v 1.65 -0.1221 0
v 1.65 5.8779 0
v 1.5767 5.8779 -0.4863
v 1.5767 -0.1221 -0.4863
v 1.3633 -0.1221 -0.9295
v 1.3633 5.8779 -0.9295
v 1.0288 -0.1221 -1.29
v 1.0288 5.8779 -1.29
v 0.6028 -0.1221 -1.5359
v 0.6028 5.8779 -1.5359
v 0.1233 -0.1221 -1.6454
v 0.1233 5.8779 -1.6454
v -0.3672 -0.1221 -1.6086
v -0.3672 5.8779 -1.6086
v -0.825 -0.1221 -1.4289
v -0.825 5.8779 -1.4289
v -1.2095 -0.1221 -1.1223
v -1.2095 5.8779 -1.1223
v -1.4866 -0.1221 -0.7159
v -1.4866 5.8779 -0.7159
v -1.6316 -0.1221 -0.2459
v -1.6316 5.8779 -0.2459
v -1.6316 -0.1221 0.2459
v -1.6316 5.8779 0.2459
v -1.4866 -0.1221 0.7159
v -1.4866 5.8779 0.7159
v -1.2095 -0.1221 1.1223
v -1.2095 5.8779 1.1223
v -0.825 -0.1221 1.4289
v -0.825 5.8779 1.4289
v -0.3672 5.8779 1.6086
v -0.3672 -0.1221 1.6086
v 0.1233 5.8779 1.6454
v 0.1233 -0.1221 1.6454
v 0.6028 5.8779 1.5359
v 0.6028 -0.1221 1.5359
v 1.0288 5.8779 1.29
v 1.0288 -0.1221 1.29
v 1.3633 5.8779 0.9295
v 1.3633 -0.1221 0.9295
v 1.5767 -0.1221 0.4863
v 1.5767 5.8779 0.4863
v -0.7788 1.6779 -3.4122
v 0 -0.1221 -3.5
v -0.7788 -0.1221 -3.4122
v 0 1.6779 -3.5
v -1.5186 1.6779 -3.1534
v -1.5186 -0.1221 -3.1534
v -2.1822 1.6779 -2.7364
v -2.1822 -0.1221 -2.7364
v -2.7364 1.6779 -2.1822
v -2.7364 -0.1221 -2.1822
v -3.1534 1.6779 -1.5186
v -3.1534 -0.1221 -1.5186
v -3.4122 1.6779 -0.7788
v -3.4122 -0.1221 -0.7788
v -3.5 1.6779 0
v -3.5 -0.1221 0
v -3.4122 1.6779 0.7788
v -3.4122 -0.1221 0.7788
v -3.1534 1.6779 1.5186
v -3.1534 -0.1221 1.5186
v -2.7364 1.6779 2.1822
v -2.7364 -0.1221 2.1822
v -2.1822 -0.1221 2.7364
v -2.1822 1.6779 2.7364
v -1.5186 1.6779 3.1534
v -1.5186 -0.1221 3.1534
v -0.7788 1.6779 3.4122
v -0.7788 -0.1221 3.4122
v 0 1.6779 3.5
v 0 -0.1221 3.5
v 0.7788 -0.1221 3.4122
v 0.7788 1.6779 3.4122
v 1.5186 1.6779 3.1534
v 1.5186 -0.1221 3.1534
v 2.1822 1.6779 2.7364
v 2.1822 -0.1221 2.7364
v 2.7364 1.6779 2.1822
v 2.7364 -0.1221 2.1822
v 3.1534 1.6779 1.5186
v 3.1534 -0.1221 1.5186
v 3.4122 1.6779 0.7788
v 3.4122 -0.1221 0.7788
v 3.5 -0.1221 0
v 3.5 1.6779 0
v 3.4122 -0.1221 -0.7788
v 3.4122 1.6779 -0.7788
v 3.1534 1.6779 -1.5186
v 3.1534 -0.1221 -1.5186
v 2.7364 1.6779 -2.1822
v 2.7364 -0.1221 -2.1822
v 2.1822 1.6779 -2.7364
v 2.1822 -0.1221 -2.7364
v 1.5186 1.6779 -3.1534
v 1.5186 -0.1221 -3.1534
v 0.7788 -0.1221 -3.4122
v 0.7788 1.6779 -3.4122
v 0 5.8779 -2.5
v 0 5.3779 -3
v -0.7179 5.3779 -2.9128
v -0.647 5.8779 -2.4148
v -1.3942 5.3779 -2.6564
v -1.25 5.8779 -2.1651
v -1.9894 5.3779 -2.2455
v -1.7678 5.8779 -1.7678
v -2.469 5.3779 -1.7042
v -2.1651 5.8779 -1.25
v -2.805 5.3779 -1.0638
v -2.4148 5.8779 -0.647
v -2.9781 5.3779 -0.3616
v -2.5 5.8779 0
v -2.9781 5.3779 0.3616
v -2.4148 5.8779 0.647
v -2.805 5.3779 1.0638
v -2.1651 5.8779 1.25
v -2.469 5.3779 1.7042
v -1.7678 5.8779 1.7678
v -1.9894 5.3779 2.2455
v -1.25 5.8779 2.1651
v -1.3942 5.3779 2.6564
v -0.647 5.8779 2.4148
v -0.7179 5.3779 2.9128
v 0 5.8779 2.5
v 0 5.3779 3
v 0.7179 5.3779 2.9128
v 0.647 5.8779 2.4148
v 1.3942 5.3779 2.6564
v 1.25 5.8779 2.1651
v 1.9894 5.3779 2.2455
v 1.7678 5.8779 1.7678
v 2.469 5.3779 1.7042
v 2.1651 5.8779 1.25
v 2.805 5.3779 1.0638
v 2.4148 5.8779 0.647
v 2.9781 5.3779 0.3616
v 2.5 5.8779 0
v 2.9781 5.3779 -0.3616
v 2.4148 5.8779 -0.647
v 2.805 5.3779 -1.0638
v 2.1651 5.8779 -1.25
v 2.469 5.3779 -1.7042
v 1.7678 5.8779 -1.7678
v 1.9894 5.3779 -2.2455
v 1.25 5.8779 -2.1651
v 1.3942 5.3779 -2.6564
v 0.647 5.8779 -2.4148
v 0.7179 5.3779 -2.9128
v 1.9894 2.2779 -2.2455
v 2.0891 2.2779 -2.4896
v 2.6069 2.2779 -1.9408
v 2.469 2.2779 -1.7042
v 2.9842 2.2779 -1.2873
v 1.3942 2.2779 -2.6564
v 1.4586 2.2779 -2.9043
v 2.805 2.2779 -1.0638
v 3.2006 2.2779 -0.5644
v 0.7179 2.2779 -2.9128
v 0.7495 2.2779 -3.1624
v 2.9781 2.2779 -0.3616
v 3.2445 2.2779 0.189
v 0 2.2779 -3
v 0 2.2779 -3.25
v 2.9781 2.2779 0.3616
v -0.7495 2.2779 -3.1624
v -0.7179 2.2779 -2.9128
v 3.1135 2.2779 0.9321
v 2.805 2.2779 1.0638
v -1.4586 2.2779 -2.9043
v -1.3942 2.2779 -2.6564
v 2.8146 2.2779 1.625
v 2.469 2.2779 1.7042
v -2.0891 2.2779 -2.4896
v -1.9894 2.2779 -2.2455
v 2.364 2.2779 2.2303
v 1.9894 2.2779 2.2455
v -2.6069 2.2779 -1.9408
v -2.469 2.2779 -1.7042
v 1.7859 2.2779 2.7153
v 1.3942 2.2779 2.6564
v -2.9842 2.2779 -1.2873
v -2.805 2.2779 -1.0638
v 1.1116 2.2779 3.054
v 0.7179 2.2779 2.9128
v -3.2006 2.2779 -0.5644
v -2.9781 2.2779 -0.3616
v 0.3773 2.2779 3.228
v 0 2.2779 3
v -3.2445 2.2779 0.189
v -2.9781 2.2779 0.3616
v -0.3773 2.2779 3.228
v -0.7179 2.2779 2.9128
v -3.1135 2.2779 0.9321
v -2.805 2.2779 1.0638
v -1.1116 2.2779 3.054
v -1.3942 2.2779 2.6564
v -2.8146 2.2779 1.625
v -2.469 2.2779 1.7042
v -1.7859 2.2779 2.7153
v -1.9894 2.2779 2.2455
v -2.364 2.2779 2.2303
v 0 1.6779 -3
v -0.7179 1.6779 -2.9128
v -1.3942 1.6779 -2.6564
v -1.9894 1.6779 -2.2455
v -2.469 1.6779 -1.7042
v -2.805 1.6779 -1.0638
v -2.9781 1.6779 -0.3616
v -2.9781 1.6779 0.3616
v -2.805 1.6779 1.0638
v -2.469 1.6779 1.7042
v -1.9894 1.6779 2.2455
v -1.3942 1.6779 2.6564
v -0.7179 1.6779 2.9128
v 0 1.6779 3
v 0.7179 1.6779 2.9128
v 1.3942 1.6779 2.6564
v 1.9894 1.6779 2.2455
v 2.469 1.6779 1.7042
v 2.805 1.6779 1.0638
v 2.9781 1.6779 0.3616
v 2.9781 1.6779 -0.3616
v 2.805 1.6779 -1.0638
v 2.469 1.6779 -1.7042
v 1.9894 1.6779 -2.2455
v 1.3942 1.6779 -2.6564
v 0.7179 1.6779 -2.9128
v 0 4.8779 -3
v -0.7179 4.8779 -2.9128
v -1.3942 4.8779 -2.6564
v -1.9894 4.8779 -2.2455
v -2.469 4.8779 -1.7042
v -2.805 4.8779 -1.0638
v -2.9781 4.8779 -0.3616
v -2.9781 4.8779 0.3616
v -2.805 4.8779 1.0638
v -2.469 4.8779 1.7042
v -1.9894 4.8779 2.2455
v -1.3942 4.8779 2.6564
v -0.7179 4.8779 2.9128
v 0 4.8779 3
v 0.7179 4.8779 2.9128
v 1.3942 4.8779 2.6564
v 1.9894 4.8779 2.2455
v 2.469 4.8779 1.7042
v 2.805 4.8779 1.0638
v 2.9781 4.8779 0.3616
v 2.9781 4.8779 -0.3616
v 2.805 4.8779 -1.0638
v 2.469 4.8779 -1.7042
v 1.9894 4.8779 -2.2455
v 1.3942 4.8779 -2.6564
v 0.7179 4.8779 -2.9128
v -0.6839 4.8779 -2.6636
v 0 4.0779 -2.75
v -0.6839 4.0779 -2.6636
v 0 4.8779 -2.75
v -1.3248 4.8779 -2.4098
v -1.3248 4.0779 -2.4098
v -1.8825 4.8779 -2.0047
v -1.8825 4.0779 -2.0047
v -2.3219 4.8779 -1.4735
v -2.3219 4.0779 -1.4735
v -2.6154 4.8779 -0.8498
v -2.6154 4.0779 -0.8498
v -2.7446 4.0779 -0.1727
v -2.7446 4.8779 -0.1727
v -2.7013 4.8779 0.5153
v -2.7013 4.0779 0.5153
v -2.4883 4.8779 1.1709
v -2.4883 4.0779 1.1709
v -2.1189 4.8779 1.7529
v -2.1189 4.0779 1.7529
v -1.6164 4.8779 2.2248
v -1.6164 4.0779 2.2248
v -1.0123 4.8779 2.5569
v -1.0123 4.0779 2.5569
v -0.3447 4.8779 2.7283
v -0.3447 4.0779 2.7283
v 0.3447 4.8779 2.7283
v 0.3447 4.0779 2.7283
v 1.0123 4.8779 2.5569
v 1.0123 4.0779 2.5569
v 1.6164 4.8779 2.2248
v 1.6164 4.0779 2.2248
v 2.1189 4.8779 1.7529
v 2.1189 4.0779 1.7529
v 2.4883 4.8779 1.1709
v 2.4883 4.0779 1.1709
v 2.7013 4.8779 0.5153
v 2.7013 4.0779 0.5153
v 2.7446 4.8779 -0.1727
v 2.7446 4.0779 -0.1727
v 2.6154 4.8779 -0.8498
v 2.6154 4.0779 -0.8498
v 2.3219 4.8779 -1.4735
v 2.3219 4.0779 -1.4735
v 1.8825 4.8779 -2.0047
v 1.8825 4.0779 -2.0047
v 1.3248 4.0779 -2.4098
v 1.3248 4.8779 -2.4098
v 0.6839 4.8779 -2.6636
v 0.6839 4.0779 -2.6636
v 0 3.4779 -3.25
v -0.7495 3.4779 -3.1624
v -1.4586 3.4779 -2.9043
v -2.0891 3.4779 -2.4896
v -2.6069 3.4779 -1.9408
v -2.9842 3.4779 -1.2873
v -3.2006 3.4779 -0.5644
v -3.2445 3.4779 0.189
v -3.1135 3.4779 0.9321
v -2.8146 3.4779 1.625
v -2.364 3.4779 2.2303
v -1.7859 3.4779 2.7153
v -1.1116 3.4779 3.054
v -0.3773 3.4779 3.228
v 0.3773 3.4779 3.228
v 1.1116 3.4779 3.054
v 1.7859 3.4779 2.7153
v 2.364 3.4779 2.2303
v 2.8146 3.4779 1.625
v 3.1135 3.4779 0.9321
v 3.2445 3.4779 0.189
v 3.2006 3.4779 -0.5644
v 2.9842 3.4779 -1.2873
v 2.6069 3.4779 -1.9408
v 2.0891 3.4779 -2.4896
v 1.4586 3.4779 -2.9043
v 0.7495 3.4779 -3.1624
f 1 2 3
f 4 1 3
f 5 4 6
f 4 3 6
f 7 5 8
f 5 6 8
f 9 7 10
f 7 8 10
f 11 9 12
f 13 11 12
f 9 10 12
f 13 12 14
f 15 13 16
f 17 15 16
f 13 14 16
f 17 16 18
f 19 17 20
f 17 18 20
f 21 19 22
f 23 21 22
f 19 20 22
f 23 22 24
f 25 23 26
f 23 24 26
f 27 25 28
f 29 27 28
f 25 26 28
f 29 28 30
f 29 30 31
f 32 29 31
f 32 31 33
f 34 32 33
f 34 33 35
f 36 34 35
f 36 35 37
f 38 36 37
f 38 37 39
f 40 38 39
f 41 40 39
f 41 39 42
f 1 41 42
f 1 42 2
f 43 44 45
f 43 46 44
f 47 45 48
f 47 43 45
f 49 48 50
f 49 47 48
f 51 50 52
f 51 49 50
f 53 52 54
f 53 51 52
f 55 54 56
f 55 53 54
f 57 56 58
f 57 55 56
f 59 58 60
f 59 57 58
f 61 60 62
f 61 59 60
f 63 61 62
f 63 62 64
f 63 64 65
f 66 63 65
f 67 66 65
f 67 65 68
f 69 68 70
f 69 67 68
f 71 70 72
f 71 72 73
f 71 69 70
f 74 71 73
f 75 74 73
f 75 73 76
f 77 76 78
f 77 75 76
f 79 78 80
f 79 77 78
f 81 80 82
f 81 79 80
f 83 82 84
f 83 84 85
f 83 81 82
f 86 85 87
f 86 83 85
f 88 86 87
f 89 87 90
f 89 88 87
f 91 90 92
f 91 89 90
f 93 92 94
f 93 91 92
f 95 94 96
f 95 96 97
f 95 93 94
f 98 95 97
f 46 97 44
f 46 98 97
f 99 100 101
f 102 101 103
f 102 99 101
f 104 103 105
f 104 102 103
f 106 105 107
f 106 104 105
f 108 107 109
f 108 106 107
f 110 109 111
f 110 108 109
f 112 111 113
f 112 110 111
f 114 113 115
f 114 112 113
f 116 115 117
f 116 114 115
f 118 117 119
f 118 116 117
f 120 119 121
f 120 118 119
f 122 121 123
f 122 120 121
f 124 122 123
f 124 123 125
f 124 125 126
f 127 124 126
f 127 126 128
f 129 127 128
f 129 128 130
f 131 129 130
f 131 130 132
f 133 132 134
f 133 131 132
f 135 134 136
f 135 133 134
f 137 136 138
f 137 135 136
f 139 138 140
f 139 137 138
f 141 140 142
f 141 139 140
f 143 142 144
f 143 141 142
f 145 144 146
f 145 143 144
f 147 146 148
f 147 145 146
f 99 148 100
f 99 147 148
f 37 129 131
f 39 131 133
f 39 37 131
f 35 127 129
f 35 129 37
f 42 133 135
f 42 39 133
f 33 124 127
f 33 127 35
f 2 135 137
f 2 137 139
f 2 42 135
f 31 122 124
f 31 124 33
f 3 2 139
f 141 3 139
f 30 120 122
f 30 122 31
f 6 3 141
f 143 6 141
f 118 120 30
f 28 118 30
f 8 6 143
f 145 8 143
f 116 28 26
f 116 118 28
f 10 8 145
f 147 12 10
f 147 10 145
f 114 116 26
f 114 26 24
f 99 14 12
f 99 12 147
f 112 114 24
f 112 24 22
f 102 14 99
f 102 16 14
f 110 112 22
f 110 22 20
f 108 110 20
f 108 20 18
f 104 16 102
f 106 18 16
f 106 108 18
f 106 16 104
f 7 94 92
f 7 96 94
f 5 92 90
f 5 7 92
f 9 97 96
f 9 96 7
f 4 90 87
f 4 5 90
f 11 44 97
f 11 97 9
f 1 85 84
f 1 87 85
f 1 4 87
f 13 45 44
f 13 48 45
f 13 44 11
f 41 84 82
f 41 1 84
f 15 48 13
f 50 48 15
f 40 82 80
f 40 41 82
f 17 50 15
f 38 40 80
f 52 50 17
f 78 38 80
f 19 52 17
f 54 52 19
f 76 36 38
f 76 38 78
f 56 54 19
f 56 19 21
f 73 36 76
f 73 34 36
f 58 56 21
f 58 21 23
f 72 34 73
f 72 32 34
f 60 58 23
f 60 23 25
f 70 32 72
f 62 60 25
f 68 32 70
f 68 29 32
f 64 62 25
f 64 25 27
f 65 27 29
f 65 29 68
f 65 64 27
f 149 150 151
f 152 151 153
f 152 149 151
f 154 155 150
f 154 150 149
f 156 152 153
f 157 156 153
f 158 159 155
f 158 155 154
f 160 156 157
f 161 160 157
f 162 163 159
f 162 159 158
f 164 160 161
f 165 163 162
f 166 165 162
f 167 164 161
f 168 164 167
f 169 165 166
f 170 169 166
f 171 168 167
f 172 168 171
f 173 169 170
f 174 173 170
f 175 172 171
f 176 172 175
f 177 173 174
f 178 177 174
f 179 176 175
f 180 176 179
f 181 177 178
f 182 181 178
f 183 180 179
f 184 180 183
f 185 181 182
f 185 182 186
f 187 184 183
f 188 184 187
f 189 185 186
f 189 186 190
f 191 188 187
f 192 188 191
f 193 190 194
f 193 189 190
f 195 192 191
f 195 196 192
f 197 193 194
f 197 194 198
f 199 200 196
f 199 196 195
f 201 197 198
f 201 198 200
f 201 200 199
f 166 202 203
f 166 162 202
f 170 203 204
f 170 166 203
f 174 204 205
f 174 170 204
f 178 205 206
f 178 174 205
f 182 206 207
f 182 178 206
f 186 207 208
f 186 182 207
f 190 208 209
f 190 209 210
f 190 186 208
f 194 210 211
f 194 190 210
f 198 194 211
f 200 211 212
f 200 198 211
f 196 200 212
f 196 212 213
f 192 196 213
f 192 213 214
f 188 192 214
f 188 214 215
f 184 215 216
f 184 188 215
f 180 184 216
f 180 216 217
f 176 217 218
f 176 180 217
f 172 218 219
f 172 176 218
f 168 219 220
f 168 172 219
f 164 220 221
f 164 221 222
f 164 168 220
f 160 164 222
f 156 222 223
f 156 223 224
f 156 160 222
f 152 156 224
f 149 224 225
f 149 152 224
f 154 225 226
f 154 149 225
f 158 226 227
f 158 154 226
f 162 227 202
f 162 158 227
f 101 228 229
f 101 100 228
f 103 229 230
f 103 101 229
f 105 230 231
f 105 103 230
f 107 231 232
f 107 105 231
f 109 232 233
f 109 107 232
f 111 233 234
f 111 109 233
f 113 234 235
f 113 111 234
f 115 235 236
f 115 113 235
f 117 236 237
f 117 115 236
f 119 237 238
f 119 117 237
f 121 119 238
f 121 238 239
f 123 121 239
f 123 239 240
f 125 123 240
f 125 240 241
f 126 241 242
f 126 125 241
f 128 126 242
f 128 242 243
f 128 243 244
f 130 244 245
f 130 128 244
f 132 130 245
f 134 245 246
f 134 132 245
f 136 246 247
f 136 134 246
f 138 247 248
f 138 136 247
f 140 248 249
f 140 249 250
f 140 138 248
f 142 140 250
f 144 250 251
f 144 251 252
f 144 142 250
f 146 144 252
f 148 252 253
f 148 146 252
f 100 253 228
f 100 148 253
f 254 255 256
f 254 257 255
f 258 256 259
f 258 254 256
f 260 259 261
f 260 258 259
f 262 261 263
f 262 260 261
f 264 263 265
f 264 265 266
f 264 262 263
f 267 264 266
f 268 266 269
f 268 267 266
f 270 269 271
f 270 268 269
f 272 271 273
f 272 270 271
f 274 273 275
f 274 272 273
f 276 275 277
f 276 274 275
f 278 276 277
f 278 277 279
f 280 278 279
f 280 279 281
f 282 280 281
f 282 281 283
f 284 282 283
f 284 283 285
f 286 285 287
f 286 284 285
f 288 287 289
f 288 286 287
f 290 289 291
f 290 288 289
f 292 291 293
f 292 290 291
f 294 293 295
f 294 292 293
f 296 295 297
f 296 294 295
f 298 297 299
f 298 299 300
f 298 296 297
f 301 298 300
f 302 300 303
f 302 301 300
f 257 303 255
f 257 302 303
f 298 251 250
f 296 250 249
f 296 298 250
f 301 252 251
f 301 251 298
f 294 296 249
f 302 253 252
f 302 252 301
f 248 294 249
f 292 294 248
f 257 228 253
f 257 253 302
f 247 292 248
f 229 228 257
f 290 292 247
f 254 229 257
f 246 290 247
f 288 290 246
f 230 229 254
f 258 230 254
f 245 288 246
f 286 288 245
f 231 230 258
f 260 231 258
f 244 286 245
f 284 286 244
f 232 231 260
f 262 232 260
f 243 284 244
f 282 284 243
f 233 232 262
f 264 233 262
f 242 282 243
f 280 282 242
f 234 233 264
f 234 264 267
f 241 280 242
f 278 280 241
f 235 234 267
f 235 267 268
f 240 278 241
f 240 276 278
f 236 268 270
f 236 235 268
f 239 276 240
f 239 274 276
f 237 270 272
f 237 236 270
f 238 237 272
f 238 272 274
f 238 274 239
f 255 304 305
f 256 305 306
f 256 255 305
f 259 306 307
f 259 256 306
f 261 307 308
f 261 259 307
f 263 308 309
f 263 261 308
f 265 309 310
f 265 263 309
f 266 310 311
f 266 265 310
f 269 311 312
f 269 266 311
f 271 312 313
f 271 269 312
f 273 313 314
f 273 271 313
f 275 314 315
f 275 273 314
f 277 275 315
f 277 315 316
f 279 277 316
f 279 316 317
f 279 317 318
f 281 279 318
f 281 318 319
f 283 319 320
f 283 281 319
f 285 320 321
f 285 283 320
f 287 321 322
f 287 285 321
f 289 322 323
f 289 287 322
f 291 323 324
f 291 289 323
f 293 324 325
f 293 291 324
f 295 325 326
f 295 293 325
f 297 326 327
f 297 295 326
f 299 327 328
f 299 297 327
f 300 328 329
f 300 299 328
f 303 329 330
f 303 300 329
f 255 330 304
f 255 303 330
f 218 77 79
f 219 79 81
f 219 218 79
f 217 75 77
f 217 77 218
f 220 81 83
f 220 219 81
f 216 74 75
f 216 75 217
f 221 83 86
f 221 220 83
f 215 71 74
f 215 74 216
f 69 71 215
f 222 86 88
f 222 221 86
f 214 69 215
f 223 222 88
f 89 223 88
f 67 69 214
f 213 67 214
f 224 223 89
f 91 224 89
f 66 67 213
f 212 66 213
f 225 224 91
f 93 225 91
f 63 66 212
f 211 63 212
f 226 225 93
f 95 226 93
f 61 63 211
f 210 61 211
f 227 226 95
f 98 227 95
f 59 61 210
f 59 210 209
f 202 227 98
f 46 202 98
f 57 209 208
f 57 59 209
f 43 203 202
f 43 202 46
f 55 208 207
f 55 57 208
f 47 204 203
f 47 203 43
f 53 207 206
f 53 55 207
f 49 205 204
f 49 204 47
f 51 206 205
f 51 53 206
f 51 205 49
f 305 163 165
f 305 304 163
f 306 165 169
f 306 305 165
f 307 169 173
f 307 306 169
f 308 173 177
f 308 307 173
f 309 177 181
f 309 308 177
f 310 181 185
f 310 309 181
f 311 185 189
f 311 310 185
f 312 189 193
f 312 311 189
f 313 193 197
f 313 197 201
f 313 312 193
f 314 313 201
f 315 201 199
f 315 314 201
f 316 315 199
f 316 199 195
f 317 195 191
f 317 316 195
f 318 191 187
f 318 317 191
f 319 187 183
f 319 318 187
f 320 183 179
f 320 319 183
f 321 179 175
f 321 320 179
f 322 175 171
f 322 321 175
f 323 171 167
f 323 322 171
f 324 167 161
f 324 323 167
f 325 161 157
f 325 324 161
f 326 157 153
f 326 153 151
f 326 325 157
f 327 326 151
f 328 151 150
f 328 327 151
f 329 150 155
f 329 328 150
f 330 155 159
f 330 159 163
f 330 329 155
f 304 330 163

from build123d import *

# Parameters (mm, degrees)
HOLE_WIZARD_M41_D = 3.3


with BuildPart() as part:
    # Эскиз2 → Повернуть1 (revolve)
    with BuildSketch(Plane.XY, mode=Mode.PRIVATE) as revolve_1_sk:
        Polygon((1.5, -0.122080905), (3.5, -0.122080905), (3.5, 1.677919095), (3, 1.677919095), (3, 2.277919095), (3.25, 2.277919095), (3.25, 3.477919095), (2.75, 4.077919095), (2.75, 4.877919095), (3, 4.877919095), (3, 5.377919095), (2.5, 5.877919095), (1.5, 5.877919095), align=None)
    revolve(revolve_1_sk.sketch.rotate(Axis((0, 0, 0), (0, 1, 0)), 90), axis=Axis((0, 0, 0), (0, 1, 0)))

    # Отверстие обработанное метчиком M41 (through all)
    with Locations(Plane(origin=(0, -0.122080905, 0), x_dir=(-1, 0, 0), z_dir=(0, -1, 0))):
        with Locations((0, 0)):
            Hole(HOLE_WIZARD_M41_D / 2)


solid = part.part
